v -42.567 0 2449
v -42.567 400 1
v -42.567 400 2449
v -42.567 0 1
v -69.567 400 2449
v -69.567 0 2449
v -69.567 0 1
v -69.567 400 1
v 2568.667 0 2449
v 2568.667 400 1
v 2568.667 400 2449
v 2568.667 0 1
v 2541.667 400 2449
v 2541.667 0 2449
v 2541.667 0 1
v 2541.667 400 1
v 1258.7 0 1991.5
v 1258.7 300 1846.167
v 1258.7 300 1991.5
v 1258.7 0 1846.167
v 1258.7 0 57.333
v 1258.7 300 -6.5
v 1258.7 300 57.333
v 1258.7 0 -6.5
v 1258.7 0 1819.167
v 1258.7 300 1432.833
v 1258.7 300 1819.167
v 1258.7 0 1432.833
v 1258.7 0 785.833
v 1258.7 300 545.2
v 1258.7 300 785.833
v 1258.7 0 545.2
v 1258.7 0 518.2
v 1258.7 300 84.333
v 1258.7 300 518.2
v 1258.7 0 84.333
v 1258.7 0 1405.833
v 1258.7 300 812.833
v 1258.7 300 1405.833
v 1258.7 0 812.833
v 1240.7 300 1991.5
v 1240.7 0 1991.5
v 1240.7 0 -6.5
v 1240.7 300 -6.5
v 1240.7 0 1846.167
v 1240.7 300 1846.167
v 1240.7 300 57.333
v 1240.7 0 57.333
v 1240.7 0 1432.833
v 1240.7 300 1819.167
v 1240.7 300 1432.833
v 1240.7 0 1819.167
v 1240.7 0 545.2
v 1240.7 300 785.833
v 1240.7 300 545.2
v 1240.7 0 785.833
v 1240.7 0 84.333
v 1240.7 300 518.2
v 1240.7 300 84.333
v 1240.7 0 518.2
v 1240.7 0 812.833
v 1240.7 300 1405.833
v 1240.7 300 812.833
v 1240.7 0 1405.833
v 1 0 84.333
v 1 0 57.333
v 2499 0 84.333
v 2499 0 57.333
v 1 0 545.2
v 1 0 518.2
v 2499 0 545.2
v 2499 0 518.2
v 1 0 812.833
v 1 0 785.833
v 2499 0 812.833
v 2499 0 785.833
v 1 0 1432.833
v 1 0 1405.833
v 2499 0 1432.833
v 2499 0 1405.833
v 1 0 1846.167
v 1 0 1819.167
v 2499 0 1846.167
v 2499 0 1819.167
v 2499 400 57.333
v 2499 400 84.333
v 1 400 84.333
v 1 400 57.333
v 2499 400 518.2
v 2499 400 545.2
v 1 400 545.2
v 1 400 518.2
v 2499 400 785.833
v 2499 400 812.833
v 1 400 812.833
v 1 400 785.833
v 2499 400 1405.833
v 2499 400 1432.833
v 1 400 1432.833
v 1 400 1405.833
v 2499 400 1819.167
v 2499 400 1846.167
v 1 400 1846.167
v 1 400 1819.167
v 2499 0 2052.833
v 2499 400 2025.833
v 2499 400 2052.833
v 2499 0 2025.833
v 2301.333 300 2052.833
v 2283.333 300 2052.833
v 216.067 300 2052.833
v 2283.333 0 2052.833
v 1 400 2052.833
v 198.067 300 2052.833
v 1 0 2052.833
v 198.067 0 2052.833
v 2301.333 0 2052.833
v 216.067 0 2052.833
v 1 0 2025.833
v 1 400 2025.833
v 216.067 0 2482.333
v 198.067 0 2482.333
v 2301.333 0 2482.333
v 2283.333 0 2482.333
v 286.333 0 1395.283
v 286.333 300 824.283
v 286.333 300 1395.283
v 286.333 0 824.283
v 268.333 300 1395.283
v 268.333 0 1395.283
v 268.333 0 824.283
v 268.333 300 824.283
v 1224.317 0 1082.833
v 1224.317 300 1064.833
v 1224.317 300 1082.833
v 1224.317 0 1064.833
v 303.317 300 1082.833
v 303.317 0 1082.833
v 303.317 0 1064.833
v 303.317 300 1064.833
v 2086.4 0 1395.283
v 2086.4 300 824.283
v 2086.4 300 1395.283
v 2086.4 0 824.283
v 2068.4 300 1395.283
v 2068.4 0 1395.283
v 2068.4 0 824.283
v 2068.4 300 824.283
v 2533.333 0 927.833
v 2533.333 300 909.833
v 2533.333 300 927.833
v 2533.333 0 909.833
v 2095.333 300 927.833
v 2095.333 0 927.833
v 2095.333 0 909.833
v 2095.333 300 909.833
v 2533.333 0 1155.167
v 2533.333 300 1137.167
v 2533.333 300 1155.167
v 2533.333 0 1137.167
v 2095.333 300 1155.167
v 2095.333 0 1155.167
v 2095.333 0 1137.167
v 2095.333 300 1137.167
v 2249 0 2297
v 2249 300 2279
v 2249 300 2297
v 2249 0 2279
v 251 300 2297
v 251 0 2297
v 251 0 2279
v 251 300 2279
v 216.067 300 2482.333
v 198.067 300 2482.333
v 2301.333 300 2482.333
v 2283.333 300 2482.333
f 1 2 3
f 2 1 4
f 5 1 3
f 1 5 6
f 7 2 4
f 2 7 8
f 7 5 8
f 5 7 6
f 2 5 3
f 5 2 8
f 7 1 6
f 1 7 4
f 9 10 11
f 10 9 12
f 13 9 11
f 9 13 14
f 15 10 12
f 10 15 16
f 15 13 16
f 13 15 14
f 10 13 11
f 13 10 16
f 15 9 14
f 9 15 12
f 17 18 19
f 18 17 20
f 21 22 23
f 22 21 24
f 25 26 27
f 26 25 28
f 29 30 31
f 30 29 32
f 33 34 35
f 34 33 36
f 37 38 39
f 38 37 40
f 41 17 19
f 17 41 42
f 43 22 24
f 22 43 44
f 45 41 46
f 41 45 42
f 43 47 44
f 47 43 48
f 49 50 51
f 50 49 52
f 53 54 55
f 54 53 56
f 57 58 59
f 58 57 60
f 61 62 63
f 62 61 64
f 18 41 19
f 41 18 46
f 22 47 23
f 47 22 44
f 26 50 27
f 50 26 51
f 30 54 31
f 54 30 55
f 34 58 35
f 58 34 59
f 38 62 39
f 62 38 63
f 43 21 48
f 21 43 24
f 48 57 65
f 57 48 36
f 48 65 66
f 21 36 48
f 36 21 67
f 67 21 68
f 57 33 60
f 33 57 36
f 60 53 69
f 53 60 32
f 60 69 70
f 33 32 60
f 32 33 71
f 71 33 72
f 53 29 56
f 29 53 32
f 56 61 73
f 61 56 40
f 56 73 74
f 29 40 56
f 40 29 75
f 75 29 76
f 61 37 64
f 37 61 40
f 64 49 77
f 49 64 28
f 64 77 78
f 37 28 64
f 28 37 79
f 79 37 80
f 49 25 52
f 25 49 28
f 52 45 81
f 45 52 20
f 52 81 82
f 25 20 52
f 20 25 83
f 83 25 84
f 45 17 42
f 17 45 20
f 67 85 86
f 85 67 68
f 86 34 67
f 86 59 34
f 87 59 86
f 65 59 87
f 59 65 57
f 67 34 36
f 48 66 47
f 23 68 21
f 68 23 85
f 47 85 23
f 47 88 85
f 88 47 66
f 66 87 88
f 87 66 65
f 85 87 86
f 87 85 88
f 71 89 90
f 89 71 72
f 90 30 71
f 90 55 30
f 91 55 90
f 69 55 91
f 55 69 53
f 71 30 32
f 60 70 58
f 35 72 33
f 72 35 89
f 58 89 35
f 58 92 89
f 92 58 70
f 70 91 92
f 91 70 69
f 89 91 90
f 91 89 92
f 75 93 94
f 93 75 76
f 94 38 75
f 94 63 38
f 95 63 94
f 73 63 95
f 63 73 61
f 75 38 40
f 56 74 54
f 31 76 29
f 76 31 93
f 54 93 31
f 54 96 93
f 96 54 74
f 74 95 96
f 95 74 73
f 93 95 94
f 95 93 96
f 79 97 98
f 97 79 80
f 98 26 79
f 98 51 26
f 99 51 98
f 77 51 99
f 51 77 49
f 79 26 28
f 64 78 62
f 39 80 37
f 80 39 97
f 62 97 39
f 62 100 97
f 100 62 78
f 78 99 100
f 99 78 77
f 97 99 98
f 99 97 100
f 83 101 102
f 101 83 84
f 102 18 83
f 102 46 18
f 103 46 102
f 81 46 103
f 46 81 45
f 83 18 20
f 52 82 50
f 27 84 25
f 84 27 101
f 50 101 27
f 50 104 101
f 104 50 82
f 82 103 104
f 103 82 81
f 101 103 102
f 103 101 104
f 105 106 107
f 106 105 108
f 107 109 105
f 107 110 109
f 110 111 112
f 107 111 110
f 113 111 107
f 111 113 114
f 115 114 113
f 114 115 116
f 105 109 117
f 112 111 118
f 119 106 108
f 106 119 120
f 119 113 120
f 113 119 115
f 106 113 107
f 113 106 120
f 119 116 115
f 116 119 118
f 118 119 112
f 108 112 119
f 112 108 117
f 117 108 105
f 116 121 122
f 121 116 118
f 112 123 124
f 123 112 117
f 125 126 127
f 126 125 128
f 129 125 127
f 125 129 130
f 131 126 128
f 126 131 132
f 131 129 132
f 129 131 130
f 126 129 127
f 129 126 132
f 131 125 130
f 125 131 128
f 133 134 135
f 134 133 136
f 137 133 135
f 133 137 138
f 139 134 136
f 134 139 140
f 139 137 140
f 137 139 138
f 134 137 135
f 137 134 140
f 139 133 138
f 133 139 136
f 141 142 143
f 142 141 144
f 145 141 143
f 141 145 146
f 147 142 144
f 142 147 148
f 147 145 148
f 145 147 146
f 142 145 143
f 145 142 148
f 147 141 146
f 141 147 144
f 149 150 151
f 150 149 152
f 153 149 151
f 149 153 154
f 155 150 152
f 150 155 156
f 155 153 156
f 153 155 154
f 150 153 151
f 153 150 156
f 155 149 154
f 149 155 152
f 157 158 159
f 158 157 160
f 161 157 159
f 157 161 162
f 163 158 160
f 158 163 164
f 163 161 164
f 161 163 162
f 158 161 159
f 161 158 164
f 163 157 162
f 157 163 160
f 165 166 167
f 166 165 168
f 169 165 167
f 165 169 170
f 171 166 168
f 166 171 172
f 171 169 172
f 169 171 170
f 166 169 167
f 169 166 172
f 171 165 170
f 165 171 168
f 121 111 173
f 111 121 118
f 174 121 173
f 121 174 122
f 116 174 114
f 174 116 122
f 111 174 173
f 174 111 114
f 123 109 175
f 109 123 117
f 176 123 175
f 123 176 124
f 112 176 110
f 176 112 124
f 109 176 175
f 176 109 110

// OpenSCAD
GAP = 1;
PLEN = 2500; // plank length
PTCK =   27; // plank thickness

PTCK2 =   18; // plank thickness

//XWID =  280; // extention width

DLEN = (PLEN) / 2 +20; // door length
DTCK = 5;

WID1 = 300; // width 1
WID2 = 400; // width 2

PHIG = 95; // plinth height

//SHIFT = PTCK*0; // front-shift intermediate vplancks
HEIGHT = 2450;

XPLO_K = 1/30;

//////////////////////////////////////////////////

module _vplank(length, xpos, zpos, width, tck=PTCK) {
	xplo_x = xpos - PLEN/2;
	xplo_z = length/2 + zpos - HEIGHT/2;
	translate([ xplo_x * XPLO_K, 0, xplo_z * XPLO_K])  // EXPLO

	color(tck==PTCK ? "black" : "#fdd", tck==PTCK ? 1 : .25)
	translate([xpos, 0, zpos + GAP])
	cube([tck, width, length - GAP*2]);
	echo("Plank " , width, length);
}

module vplank1(length, xpos, zpos=0)
       _vplank(length, xpos, zpos, WID1);
module vplank2(length, xpos, zpos=0)
       _vplank(length, xpos, zpos, WID2);
module vplank3(length, xpos, zpos=0)
       _vplank(length, xpos, zpos, WID1, PTCK2);

//////////////////////////////////////////////////

module _hplank(length, zpos, xpos, width, tck=PTCK) {
	xplo_x = length/2 + xpos - PLEN/2;
	xplo_z = zpos - HEIGHT/2;
	translate([ xplo_x * XPLO_K, 0, xplo_z * XPLO_K])  // EXPLO

	color(tck==PTCK ? "black" : "#fdd", tck==PTCK ? 1 : .25)
	translate([xpos + GAP, 0, zpos])
	cube([length - GAP*2, width, tck]);
	echo("Plank " , width, length);
}

module hplank0(length, zpos, xpos=0)
       _hplank(length, zpos, xpos, WID0);
module hplank1(length, zpos, xpos=0)
       _hplank(length, zpos, xpos, WID1);
module hplank2(length, zpos, xpos=0)
       _hplank(length, zpos, xpos, WID2);

module hplank3(length, zpos, xpos=0)
       _hplank(length, zpos, xpos, WID1, PTCK2);

//////////////////////////////////////////////////

module _door(length, height, xpos, zpos, is_front) {
	DTCK = 5;
	depth = WID2-5 - DTCK * (is_front?1:2.5);
*
	translate([0, 200, 0])  // EXPLO

	translate([xpos, depth, zpos])
	cube([length, DTCK, height]);	
}

module door(length, height, xpos, zpos, is_front)
	color("white")
	_door(length, height, xpos, zpos, is_front);

module glassdoor(length, height, xpos, zpos, is_front)
	%_door(length, height, xpos, zpos, is_front);

//////////////////////////////////////////////////
module object(w, h, d, x, y, f=0) {
	color(rands(0, 1, 3))
	translate([x+GAP, f+GAP, y+GAP])
	cube([w-GAP*2, d-GAP*2, h-GAP*2]);
}
//////////////////////////////////////////////////

module shelf()
{
	// verticals
	
	// - rightmost
	vplank2(2450, -PTCK, 0);
	
	// - left
	vplank2(2450, PLEN, 0);

     // - mid
color("#bbb")
	vplank3(2000 - 0*PTCK, PLEN/2 - PTCK2/2, 0);
	
	// plinth
*
	color([.25, 0, 0])
	translate([0, WID2 - 40, 0])
	cube([PLEN, 20, PHIG]);

	// bottom trunk, height 42 cm
	echo("bdoor", 600-PTCK-PHIG -PTCK*2 -5);
	hplank2(PLEN, PHIG);
	hplank2(PLEN, 800 - 200 -PTCK*2 -5);
	door(DLEN, 600-PTCK-PHIG -PTCK*2 -5, PLEN-DLEN, PHIG+PTCK, true);
	door(DLEN, 600-PTCK-PHIG -PTCK*2 -5,         0, PHIG+PTCK, false);
	
	// dvds
	// - drawer
*
	#hplank3(PLEN, 800 - 200 -PTCK);	
	hplank2(PLEN, 800);

	// top trunk, height 37 cm
	hplank2(PLEN, 1400);	
	hplank2(PLEN, 1800);
	door(DLEN, 400-PTCK, PLEN-DLEN, 1400+PTCK, true);
	door(DLEN, 400-PTCK,         0, 1400+PTCK, false);
	
	// top showcase, height 20 cm
	hplank2(PLEN, 2000);
	glassdoor(DLEN, 200, PLEN-DLEN, 1800, true);
	glassdoor(DLEN, 200,         0, 1800, false);
	
	// mid right shelves: books
	vplank3(600 - PTCK, 300, 800 + PTCK);
	hplank3(PLEN/2-300 - PTCK2 - PTCK2/2, 800 + 270, 300+PTCK2);
	
	// mid left shelves: computer & hifi
	vplank3(600 - PTCK, PLEN - PTCK2 - 440, 800 + PTCK);	
	hplank3(440,  920, PLEN-440);
	hplank3(440, 1140, PLEN-440);
		
	// top bookcase
	hplank3(2000, 2245, (PLEN-2000)/2);
	vplank3(450, (PLEN-2000)/2 - PTCK2, 2000);
	vplank3(450, (PLEN-2000)/2 + 2000, 2000);
}

module dvds() {
	///////////////////////////////////////////////////////
	// DVDs: 20 sets, 338 DVDs
	
	// - 20 DVD sets
	translate([0, PTCK, 0])
	for (i = [0:9]) {
		object(45, 195, 140, i*45, 600, 200);
		object(45, 140, 195, i*45, 600);
	}
	
	// - 132 DVDs
	translate([10*45, PTCK, 0])
	for (i = [1:66]) {
		translate([(i-1)*12, 0, 0]) {
			object(12, 195, 140, 0, 600, 200);
			object(12, 140, 195, 0, 600);
		}
	}
	
	// 206 DVDs
	translate([PLEN/2 + PTCK/2, PTCK, 0])
	for (i = [0:102]) {
		object(12, 195, 140, i*12, 600, 200);
		object(12, 140, 195, i*12, 600);
	}
}

module books() {	
	///////////////////////////////////////////////////////
	// Books
	
	// 328 Pocket books 
	
	// - 160 books
	translate([(PLEN-2000)/2, PTCK, 0])
	for (i = [1:80]) {
		object(25, 180, 110, (i-1)*25, 2262, 0);
		object(25, 180, 110, (i-1)*25, 2262, 115);
	}

	// - 168 books
	translate([(PLEN-2000)/2, PTCK, 0])
	for (i = [1:80]) {
		object(25, 180, 110, (i-1)*25, 2000+PTCK, 0);
		object(25, 180, 110, (i-1)*25, 2000+PTCK, 115);
	}

	// 61 Cook books
	for (i = [1:61]) {
		object(15, 230, 180, (i-1)*15 + 300+PTCK2, 800+PTCK, 100);
	}
	
	// 40 albums
	for (i = [1:40]) {
		object(15, 300, 200, (i-1)*15 + 300+PTCK2, 1070+PTCK, 100);
	}
	
	// atlas, dicts
	for (i = [1:2]) {
		object(40, 400, 300, (i-1)*40, 800+PTCK);
	}
	for (i = [1:3]) {
		object(60, 250, 180, 2*40 + (i-1)*60, 800+PTCK);
	}
}

module speakers() {
	///////////////////////////////////////////////////////
	// Speakers
	
	color("black") {
		object(210, 370, 300,         0, 2000+PTCK, 100);
		object(210, 370, 300,  PLEN-210, 2000+PTCK, 100);
	}
}

module computer() {
	//////////////////////////////////////////////////
	// Computer
	
	// - screen
	translate([80, 0, 0])
	color("silver") {
		object(600, 380, 50, PLEN/2, 800 + PTCK + 90, 50);
		object(40, 200, 50, PLEN/2 + 300-20, 800 + PTCK, 0);
		object(200, 20, 100, PLEN/2 + 300-100, 800 + PTCK, 0);
	}
	
	// keyboard+mouse
	color("silver")
	object(460, 20, 130, PLEN/2 + 250, 800 + PTCK, 250);

	color("silver")
	object(55, 30, 90, PLEN/2 + 90, 800 + PTCK, 270);

	// - macmini + DVD
	color("silver")
	object(196, 36, 196, PLEN-440 + 5, 800 + PTCK, 150);
	color("white")
	object(196, 36, 196, PLEN-440 + 5, 800 + PTCK + 37, 150);
}

module hifi() {	
	//////////////////////////////////////////////////
	// Hifi
	
	// - receiver
	color([.25, .25, .25])
	object(435, 150-10, 300, PLEN-435, 920+PTCK+10, 50);
	
	// - DVD player
	color("black")
	object(435, 40-3, 250, PLEN-435, 920+PTCK+150+3, 100);
	
	// - squeezebox
	color([.25, .25, .25])
	object(150, 100, 80, PLEN-150, 800+PTCK, 270);
}

shelf();

if(0) {
	dvds();
	books();
	hifi();
	speakers();
	computer();
}
